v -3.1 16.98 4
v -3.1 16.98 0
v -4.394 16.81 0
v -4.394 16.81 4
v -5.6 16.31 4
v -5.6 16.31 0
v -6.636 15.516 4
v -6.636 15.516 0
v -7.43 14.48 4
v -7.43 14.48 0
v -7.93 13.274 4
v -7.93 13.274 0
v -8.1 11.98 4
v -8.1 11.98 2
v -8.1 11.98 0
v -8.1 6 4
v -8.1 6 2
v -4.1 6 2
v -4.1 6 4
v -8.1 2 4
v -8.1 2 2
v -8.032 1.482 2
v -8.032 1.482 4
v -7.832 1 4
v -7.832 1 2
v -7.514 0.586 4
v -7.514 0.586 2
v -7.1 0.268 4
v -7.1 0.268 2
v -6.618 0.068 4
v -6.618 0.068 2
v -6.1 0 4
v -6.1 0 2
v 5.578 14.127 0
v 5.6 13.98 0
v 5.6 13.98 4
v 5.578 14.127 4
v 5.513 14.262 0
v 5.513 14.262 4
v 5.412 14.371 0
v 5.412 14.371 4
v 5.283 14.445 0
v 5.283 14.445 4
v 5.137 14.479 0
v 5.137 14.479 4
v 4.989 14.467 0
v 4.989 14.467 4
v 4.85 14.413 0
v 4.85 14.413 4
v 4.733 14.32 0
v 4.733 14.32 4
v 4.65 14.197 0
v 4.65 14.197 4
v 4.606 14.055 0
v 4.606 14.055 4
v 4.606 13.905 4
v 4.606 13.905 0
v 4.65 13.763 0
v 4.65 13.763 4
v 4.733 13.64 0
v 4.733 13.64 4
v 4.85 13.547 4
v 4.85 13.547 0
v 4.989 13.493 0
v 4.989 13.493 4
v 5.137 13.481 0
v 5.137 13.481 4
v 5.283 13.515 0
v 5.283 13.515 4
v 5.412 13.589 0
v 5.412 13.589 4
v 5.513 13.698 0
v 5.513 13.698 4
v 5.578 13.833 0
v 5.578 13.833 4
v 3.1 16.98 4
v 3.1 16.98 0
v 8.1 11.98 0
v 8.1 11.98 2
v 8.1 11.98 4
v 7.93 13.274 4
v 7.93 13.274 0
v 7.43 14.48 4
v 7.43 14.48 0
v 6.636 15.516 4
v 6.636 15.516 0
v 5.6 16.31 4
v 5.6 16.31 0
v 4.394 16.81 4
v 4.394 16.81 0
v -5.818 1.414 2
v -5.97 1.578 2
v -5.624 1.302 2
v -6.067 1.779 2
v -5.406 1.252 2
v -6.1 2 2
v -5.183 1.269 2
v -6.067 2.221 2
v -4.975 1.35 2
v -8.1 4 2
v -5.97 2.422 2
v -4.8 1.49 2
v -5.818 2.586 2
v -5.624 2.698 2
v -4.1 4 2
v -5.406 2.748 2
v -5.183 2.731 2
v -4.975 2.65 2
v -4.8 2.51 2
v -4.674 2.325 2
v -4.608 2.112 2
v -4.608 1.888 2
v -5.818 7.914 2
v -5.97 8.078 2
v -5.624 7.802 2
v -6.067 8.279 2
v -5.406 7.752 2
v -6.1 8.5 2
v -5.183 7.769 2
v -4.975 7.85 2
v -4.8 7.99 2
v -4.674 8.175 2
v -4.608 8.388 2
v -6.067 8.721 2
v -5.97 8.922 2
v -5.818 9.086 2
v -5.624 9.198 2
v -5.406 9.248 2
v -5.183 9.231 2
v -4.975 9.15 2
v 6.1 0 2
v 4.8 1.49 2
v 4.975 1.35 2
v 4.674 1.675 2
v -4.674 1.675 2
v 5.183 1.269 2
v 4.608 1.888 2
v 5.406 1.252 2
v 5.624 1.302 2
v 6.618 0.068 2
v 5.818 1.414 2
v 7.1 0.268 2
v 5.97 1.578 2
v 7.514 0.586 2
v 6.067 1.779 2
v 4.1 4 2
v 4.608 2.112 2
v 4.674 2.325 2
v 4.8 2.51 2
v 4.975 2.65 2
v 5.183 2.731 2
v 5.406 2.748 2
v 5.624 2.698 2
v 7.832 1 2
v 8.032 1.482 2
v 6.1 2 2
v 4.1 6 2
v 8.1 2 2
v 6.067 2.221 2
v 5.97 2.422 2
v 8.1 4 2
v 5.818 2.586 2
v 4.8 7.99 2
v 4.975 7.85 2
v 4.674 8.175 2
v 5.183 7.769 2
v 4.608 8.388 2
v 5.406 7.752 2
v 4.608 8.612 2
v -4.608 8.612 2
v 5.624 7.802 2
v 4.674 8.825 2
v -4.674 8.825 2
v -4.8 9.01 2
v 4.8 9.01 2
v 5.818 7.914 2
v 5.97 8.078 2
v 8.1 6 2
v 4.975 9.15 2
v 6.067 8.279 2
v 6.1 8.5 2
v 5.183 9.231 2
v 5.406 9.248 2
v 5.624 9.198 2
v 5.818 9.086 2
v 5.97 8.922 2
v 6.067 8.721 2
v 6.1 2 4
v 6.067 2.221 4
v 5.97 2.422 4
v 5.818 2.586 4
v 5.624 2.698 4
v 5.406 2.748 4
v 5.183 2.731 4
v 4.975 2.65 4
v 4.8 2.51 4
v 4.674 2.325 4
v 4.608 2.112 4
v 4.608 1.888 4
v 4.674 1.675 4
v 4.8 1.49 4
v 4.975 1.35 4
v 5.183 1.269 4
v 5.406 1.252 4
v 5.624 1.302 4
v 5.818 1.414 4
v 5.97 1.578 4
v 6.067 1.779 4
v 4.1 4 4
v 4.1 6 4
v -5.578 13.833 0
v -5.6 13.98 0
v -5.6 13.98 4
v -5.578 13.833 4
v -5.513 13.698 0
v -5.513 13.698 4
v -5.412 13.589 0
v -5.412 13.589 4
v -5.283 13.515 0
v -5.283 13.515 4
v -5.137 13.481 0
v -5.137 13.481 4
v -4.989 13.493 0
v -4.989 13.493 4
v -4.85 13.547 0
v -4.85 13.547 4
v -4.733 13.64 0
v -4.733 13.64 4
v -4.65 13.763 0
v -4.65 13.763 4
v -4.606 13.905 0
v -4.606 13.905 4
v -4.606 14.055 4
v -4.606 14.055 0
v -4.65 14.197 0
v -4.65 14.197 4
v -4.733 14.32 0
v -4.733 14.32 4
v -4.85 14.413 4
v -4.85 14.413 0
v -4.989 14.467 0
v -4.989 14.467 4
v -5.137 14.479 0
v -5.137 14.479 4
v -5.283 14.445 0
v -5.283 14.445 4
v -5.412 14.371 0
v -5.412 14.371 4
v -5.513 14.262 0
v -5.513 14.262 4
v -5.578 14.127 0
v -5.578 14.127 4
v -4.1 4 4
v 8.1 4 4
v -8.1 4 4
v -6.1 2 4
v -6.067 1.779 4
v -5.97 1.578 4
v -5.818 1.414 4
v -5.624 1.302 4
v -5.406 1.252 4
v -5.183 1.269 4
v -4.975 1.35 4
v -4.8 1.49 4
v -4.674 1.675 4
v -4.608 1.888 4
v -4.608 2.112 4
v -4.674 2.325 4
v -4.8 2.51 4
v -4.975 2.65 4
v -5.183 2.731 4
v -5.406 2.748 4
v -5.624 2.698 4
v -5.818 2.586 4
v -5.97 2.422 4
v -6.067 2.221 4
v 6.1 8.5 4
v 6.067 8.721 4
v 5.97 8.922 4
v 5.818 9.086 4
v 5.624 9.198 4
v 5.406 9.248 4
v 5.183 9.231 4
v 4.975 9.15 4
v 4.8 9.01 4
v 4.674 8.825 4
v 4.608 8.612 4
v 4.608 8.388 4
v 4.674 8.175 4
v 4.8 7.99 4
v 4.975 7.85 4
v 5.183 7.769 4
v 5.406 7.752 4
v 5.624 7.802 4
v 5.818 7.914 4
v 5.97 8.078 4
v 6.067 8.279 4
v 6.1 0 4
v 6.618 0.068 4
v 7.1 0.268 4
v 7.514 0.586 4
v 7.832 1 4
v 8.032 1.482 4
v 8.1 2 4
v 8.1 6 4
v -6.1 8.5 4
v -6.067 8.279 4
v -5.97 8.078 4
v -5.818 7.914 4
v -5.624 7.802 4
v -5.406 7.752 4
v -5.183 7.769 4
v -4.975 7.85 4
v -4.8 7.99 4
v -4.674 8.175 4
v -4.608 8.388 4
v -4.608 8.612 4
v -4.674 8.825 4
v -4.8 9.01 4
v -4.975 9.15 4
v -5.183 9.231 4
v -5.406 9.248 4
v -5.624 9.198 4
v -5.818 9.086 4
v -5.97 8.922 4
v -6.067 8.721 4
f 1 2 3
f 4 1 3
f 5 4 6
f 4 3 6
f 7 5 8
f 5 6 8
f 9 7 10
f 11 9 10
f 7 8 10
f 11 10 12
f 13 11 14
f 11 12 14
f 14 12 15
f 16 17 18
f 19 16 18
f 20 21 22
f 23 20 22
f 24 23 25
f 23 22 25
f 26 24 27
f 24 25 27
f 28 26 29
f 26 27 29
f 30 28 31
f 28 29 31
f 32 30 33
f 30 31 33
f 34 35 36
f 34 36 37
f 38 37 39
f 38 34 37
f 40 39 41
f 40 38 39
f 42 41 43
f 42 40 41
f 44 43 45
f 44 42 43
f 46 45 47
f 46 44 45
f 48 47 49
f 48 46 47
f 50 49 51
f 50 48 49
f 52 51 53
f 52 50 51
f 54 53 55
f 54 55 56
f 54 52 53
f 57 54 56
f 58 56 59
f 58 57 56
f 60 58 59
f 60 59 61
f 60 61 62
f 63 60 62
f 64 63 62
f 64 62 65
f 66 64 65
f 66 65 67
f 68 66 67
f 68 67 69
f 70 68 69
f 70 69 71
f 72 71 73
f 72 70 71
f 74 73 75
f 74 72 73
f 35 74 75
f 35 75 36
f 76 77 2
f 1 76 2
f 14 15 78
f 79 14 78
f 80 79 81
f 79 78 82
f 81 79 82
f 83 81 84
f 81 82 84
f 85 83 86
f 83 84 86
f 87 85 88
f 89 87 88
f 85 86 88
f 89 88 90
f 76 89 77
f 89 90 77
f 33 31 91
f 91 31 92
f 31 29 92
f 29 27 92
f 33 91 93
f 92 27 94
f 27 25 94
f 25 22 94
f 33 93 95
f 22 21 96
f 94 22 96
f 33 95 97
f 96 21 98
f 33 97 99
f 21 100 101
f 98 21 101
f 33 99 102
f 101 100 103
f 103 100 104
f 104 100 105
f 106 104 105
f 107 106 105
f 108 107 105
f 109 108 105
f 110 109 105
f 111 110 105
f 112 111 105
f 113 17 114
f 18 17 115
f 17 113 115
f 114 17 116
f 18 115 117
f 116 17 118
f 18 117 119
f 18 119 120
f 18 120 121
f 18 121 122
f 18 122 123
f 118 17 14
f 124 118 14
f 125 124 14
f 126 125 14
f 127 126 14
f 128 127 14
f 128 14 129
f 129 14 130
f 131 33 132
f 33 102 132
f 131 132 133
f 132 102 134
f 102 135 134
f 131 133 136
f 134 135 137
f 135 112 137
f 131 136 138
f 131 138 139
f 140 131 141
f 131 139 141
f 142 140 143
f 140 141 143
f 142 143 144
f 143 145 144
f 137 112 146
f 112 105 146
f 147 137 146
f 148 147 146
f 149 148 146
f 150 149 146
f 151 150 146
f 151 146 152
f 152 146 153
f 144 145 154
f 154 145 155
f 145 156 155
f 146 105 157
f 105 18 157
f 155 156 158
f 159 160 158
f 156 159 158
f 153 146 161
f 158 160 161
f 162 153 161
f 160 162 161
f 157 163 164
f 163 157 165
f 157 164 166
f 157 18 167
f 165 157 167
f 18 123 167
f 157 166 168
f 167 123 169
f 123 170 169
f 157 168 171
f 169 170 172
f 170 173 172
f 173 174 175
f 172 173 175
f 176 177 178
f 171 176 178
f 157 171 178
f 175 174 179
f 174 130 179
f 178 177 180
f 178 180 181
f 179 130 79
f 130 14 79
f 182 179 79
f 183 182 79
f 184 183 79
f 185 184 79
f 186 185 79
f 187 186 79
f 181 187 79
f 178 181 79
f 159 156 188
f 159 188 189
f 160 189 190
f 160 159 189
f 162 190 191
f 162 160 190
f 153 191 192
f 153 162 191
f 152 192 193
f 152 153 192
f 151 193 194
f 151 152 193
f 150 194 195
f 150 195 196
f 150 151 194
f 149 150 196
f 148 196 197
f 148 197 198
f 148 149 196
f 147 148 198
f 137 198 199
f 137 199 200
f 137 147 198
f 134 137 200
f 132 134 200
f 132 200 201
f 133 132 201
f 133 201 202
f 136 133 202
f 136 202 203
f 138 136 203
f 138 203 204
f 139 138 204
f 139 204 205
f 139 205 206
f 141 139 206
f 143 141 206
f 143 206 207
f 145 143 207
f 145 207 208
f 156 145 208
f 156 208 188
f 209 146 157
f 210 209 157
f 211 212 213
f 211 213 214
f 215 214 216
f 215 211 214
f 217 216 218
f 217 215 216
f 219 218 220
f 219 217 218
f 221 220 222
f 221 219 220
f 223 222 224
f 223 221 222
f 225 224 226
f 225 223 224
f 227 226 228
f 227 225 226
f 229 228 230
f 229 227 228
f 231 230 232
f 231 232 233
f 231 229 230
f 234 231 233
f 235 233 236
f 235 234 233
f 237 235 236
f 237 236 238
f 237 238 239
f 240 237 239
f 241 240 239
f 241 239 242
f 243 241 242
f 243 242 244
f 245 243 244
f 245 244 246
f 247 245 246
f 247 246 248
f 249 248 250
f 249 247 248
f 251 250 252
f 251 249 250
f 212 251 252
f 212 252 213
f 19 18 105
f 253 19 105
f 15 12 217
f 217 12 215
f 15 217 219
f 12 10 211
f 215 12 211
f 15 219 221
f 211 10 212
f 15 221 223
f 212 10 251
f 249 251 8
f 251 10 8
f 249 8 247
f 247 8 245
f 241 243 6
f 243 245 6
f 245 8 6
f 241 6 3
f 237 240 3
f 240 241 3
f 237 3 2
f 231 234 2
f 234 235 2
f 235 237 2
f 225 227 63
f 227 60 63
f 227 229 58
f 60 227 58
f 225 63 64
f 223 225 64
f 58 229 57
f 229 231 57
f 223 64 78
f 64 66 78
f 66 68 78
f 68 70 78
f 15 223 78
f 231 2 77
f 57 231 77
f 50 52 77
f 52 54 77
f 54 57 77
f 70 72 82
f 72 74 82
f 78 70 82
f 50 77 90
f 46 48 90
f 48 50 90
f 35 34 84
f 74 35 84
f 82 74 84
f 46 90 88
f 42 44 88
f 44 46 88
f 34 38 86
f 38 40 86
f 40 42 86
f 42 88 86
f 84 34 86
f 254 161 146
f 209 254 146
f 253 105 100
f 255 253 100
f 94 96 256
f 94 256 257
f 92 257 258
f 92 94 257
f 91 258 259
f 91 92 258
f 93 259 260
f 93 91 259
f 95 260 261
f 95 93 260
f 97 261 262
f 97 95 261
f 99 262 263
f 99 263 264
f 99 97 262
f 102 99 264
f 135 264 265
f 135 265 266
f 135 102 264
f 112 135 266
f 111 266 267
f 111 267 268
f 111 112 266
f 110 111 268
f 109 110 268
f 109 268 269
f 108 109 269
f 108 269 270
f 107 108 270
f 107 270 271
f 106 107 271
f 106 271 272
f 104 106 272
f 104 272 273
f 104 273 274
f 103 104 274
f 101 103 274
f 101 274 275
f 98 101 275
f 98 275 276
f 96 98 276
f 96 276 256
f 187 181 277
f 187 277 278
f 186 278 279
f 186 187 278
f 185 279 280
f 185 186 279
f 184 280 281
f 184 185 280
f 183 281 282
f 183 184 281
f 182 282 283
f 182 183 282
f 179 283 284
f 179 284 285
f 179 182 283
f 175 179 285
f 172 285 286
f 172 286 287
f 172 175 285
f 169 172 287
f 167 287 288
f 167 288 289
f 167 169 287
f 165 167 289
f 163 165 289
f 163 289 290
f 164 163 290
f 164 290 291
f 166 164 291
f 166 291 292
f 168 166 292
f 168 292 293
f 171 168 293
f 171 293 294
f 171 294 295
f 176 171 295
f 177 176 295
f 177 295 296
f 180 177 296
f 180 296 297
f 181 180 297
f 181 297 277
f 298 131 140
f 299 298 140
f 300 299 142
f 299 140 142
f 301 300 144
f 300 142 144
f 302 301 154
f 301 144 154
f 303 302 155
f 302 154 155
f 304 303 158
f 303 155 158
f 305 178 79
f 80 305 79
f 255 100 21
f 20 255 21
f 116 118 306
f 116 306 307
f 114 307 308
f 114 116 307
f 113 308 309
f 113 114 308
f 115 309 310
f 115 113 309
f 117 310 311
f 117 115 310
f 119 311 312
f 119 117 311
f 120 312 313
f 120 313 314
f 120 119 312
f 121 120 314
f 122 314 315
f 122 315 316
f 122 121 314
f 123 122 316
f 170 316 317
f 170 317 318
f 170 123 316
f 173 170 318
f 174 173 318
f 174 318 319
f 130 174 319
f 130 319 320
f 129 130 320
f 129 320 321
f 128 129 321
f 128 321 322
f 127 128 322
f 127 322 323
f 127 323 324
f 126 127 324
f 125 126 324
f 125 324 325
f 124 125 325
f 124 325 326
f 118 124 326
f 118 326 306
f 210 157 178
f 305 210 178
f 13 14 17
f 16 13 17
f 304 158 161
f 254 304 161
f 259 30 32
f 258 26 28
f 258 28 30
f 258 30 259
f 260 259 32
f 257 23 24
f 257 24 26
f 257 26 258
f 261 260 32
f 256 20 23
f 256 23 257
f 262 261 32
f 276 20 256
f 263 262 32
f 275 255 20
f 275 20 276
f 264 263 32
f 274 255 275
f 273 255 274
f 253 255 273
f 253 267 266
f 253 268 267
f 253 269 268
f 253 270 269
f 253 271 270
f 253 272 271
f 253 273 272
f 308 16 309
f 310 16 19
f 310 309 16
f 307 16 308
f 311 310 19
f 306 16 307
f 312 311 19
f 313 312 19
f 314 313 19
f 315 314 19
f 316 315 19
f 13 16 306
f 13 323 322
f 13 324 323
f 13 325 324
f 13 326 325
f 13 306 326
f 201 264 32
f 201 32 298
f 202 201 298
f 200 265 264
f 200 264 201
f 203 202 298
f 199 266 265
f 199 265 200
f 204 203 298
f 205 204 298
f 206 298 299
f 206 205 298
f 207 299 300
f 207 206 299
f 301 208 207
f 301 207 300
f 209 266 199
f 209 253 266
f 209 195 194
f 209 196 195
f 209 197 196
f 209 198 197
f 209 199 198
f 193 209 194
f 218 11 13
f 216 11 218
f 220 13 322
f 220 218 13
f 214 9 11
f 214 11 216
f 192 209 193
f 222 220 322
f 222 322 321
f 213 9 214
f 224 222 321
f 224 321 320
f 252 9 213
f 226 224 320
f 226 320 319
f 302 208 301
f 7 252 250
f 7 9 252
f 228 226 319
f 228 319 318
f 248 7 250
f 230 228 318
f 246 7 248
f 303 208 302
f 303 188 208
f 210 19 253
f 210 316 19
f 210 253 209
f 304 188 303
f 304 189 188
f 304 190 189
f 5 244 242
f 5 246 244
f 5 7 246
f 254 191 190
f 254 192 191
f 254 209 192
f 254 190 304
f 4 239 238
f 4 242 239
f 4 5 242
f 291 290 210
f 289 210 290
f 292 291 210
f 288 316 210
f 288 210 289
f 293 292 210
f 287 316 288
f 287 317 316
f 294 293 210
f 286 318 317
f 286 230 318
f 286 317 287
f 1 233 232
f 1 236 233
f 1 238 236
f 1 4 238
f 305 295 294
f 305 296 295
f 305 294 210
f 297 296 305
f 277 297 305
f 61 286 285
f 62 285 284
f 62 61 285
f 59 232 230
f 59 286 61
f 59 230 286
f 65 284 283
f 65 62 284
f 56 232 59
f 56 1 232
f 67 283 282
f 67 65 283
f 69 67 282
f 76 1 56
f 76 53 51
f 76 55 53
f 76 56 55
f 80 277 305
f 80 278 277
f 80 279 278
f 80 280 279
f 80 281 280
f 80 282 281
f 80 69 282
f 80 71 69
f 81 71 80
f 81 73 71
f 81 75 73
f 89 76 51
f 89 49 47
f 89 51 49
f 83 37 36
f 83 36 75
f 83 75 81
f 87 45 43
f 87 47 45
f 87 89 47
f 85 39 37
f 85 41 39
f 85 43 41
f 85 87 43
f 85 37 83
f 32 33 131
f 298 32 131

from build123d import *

# Parameters (mm, degrees)
SKETCH1_R           = 0.75
SKETCH1_R_2         = 0.5
BOSS_EXTRUDE1_DEPTH = 4
SKETCH2_W           = 16.2
SKETCH2_H           = 11.98
CUT_EXTRUDE1_DEPTH  = 2


with BuildPart() as part:
    # Sketch1 → Boss-Extrude1 (new body)
    with BuildSketch(Plane.XY):
        with BuildLine():
            Line((3.1, 16.98), (-3.1, 16.98))
            ThreePointArc((-3.1, 16.98), (-6.635533906, 15.515533906), (-8.1, 11.98))
            Line((-8.1, 11.98), (-8.1, 6))
            Line((-8.1, 6), (-4.1, 6))
            Line((-4.1, 6), (-4.1, 4))
            Line((-4.1, 4), (-8.1, 4))
            Line((-8.1, 4), (-8.1, 2))
            ThreePointArc((-8.1, 2), (-7.514213562, 0.585786438), (-6.1, 0))
            Line((-6.1, 0), (6.1, 0))
            ThreePointArc((6.1, 0), (7.514213562, 0.585786438), (8.1, 2))
            Line((8.1, 2), (8.1, 4))
            Line((8.1, 4), (4.1, 4))
            Line((4.1, 4), (4.1, 6))
            Line((4.1, 6), (8.1, 6))
            Line((8.1, 6), (8.1, 11.98))
            ThreePointArc((8.1, 11.98), (6.635533906, 15.515533906), (3.1, 16.98))
        make_face()
        with Locations((-5.35, 2)):
            Circle(SKETCH1_R, mode=Mode.SUBTRACT)
        with Locations((-5.1, 13.98)):
            Circle(SKETCH1_R_2, mode=Mode.SUBTRACT)
        with Locations((-5.35, 8.5)):
            Circle(SKETCH1_R, mode=Mode.SUBTRACT)
        with Locations((5.35, 8.5)):
            Circle(SKETCH1_R, mode=Mode.SUBTRACT)
        with Locations((5.1, 13.98)):
            Circle(SKETCH1_R_2, mode=Mode.SUBTRACT)
        with Locations((5.35, 2)):
            Circle(SKETCH1_R, mode=Mode.SUBTRACT)
    extrude(amount=BOSS_EXTRUDE1_DEPTH)

    # Sketch2 → Cut-Extrude1 (cut)
    with BuildSketch(Plane.XY):
        with Locations((0, 5.99)):
            Rectangle(SKETCH2_W, SKETCH2_H)
    extrude(amount=CUT_EXTRUDE1_DEPTH, mode=Mode.SUBTRACT)


solid = part.part
